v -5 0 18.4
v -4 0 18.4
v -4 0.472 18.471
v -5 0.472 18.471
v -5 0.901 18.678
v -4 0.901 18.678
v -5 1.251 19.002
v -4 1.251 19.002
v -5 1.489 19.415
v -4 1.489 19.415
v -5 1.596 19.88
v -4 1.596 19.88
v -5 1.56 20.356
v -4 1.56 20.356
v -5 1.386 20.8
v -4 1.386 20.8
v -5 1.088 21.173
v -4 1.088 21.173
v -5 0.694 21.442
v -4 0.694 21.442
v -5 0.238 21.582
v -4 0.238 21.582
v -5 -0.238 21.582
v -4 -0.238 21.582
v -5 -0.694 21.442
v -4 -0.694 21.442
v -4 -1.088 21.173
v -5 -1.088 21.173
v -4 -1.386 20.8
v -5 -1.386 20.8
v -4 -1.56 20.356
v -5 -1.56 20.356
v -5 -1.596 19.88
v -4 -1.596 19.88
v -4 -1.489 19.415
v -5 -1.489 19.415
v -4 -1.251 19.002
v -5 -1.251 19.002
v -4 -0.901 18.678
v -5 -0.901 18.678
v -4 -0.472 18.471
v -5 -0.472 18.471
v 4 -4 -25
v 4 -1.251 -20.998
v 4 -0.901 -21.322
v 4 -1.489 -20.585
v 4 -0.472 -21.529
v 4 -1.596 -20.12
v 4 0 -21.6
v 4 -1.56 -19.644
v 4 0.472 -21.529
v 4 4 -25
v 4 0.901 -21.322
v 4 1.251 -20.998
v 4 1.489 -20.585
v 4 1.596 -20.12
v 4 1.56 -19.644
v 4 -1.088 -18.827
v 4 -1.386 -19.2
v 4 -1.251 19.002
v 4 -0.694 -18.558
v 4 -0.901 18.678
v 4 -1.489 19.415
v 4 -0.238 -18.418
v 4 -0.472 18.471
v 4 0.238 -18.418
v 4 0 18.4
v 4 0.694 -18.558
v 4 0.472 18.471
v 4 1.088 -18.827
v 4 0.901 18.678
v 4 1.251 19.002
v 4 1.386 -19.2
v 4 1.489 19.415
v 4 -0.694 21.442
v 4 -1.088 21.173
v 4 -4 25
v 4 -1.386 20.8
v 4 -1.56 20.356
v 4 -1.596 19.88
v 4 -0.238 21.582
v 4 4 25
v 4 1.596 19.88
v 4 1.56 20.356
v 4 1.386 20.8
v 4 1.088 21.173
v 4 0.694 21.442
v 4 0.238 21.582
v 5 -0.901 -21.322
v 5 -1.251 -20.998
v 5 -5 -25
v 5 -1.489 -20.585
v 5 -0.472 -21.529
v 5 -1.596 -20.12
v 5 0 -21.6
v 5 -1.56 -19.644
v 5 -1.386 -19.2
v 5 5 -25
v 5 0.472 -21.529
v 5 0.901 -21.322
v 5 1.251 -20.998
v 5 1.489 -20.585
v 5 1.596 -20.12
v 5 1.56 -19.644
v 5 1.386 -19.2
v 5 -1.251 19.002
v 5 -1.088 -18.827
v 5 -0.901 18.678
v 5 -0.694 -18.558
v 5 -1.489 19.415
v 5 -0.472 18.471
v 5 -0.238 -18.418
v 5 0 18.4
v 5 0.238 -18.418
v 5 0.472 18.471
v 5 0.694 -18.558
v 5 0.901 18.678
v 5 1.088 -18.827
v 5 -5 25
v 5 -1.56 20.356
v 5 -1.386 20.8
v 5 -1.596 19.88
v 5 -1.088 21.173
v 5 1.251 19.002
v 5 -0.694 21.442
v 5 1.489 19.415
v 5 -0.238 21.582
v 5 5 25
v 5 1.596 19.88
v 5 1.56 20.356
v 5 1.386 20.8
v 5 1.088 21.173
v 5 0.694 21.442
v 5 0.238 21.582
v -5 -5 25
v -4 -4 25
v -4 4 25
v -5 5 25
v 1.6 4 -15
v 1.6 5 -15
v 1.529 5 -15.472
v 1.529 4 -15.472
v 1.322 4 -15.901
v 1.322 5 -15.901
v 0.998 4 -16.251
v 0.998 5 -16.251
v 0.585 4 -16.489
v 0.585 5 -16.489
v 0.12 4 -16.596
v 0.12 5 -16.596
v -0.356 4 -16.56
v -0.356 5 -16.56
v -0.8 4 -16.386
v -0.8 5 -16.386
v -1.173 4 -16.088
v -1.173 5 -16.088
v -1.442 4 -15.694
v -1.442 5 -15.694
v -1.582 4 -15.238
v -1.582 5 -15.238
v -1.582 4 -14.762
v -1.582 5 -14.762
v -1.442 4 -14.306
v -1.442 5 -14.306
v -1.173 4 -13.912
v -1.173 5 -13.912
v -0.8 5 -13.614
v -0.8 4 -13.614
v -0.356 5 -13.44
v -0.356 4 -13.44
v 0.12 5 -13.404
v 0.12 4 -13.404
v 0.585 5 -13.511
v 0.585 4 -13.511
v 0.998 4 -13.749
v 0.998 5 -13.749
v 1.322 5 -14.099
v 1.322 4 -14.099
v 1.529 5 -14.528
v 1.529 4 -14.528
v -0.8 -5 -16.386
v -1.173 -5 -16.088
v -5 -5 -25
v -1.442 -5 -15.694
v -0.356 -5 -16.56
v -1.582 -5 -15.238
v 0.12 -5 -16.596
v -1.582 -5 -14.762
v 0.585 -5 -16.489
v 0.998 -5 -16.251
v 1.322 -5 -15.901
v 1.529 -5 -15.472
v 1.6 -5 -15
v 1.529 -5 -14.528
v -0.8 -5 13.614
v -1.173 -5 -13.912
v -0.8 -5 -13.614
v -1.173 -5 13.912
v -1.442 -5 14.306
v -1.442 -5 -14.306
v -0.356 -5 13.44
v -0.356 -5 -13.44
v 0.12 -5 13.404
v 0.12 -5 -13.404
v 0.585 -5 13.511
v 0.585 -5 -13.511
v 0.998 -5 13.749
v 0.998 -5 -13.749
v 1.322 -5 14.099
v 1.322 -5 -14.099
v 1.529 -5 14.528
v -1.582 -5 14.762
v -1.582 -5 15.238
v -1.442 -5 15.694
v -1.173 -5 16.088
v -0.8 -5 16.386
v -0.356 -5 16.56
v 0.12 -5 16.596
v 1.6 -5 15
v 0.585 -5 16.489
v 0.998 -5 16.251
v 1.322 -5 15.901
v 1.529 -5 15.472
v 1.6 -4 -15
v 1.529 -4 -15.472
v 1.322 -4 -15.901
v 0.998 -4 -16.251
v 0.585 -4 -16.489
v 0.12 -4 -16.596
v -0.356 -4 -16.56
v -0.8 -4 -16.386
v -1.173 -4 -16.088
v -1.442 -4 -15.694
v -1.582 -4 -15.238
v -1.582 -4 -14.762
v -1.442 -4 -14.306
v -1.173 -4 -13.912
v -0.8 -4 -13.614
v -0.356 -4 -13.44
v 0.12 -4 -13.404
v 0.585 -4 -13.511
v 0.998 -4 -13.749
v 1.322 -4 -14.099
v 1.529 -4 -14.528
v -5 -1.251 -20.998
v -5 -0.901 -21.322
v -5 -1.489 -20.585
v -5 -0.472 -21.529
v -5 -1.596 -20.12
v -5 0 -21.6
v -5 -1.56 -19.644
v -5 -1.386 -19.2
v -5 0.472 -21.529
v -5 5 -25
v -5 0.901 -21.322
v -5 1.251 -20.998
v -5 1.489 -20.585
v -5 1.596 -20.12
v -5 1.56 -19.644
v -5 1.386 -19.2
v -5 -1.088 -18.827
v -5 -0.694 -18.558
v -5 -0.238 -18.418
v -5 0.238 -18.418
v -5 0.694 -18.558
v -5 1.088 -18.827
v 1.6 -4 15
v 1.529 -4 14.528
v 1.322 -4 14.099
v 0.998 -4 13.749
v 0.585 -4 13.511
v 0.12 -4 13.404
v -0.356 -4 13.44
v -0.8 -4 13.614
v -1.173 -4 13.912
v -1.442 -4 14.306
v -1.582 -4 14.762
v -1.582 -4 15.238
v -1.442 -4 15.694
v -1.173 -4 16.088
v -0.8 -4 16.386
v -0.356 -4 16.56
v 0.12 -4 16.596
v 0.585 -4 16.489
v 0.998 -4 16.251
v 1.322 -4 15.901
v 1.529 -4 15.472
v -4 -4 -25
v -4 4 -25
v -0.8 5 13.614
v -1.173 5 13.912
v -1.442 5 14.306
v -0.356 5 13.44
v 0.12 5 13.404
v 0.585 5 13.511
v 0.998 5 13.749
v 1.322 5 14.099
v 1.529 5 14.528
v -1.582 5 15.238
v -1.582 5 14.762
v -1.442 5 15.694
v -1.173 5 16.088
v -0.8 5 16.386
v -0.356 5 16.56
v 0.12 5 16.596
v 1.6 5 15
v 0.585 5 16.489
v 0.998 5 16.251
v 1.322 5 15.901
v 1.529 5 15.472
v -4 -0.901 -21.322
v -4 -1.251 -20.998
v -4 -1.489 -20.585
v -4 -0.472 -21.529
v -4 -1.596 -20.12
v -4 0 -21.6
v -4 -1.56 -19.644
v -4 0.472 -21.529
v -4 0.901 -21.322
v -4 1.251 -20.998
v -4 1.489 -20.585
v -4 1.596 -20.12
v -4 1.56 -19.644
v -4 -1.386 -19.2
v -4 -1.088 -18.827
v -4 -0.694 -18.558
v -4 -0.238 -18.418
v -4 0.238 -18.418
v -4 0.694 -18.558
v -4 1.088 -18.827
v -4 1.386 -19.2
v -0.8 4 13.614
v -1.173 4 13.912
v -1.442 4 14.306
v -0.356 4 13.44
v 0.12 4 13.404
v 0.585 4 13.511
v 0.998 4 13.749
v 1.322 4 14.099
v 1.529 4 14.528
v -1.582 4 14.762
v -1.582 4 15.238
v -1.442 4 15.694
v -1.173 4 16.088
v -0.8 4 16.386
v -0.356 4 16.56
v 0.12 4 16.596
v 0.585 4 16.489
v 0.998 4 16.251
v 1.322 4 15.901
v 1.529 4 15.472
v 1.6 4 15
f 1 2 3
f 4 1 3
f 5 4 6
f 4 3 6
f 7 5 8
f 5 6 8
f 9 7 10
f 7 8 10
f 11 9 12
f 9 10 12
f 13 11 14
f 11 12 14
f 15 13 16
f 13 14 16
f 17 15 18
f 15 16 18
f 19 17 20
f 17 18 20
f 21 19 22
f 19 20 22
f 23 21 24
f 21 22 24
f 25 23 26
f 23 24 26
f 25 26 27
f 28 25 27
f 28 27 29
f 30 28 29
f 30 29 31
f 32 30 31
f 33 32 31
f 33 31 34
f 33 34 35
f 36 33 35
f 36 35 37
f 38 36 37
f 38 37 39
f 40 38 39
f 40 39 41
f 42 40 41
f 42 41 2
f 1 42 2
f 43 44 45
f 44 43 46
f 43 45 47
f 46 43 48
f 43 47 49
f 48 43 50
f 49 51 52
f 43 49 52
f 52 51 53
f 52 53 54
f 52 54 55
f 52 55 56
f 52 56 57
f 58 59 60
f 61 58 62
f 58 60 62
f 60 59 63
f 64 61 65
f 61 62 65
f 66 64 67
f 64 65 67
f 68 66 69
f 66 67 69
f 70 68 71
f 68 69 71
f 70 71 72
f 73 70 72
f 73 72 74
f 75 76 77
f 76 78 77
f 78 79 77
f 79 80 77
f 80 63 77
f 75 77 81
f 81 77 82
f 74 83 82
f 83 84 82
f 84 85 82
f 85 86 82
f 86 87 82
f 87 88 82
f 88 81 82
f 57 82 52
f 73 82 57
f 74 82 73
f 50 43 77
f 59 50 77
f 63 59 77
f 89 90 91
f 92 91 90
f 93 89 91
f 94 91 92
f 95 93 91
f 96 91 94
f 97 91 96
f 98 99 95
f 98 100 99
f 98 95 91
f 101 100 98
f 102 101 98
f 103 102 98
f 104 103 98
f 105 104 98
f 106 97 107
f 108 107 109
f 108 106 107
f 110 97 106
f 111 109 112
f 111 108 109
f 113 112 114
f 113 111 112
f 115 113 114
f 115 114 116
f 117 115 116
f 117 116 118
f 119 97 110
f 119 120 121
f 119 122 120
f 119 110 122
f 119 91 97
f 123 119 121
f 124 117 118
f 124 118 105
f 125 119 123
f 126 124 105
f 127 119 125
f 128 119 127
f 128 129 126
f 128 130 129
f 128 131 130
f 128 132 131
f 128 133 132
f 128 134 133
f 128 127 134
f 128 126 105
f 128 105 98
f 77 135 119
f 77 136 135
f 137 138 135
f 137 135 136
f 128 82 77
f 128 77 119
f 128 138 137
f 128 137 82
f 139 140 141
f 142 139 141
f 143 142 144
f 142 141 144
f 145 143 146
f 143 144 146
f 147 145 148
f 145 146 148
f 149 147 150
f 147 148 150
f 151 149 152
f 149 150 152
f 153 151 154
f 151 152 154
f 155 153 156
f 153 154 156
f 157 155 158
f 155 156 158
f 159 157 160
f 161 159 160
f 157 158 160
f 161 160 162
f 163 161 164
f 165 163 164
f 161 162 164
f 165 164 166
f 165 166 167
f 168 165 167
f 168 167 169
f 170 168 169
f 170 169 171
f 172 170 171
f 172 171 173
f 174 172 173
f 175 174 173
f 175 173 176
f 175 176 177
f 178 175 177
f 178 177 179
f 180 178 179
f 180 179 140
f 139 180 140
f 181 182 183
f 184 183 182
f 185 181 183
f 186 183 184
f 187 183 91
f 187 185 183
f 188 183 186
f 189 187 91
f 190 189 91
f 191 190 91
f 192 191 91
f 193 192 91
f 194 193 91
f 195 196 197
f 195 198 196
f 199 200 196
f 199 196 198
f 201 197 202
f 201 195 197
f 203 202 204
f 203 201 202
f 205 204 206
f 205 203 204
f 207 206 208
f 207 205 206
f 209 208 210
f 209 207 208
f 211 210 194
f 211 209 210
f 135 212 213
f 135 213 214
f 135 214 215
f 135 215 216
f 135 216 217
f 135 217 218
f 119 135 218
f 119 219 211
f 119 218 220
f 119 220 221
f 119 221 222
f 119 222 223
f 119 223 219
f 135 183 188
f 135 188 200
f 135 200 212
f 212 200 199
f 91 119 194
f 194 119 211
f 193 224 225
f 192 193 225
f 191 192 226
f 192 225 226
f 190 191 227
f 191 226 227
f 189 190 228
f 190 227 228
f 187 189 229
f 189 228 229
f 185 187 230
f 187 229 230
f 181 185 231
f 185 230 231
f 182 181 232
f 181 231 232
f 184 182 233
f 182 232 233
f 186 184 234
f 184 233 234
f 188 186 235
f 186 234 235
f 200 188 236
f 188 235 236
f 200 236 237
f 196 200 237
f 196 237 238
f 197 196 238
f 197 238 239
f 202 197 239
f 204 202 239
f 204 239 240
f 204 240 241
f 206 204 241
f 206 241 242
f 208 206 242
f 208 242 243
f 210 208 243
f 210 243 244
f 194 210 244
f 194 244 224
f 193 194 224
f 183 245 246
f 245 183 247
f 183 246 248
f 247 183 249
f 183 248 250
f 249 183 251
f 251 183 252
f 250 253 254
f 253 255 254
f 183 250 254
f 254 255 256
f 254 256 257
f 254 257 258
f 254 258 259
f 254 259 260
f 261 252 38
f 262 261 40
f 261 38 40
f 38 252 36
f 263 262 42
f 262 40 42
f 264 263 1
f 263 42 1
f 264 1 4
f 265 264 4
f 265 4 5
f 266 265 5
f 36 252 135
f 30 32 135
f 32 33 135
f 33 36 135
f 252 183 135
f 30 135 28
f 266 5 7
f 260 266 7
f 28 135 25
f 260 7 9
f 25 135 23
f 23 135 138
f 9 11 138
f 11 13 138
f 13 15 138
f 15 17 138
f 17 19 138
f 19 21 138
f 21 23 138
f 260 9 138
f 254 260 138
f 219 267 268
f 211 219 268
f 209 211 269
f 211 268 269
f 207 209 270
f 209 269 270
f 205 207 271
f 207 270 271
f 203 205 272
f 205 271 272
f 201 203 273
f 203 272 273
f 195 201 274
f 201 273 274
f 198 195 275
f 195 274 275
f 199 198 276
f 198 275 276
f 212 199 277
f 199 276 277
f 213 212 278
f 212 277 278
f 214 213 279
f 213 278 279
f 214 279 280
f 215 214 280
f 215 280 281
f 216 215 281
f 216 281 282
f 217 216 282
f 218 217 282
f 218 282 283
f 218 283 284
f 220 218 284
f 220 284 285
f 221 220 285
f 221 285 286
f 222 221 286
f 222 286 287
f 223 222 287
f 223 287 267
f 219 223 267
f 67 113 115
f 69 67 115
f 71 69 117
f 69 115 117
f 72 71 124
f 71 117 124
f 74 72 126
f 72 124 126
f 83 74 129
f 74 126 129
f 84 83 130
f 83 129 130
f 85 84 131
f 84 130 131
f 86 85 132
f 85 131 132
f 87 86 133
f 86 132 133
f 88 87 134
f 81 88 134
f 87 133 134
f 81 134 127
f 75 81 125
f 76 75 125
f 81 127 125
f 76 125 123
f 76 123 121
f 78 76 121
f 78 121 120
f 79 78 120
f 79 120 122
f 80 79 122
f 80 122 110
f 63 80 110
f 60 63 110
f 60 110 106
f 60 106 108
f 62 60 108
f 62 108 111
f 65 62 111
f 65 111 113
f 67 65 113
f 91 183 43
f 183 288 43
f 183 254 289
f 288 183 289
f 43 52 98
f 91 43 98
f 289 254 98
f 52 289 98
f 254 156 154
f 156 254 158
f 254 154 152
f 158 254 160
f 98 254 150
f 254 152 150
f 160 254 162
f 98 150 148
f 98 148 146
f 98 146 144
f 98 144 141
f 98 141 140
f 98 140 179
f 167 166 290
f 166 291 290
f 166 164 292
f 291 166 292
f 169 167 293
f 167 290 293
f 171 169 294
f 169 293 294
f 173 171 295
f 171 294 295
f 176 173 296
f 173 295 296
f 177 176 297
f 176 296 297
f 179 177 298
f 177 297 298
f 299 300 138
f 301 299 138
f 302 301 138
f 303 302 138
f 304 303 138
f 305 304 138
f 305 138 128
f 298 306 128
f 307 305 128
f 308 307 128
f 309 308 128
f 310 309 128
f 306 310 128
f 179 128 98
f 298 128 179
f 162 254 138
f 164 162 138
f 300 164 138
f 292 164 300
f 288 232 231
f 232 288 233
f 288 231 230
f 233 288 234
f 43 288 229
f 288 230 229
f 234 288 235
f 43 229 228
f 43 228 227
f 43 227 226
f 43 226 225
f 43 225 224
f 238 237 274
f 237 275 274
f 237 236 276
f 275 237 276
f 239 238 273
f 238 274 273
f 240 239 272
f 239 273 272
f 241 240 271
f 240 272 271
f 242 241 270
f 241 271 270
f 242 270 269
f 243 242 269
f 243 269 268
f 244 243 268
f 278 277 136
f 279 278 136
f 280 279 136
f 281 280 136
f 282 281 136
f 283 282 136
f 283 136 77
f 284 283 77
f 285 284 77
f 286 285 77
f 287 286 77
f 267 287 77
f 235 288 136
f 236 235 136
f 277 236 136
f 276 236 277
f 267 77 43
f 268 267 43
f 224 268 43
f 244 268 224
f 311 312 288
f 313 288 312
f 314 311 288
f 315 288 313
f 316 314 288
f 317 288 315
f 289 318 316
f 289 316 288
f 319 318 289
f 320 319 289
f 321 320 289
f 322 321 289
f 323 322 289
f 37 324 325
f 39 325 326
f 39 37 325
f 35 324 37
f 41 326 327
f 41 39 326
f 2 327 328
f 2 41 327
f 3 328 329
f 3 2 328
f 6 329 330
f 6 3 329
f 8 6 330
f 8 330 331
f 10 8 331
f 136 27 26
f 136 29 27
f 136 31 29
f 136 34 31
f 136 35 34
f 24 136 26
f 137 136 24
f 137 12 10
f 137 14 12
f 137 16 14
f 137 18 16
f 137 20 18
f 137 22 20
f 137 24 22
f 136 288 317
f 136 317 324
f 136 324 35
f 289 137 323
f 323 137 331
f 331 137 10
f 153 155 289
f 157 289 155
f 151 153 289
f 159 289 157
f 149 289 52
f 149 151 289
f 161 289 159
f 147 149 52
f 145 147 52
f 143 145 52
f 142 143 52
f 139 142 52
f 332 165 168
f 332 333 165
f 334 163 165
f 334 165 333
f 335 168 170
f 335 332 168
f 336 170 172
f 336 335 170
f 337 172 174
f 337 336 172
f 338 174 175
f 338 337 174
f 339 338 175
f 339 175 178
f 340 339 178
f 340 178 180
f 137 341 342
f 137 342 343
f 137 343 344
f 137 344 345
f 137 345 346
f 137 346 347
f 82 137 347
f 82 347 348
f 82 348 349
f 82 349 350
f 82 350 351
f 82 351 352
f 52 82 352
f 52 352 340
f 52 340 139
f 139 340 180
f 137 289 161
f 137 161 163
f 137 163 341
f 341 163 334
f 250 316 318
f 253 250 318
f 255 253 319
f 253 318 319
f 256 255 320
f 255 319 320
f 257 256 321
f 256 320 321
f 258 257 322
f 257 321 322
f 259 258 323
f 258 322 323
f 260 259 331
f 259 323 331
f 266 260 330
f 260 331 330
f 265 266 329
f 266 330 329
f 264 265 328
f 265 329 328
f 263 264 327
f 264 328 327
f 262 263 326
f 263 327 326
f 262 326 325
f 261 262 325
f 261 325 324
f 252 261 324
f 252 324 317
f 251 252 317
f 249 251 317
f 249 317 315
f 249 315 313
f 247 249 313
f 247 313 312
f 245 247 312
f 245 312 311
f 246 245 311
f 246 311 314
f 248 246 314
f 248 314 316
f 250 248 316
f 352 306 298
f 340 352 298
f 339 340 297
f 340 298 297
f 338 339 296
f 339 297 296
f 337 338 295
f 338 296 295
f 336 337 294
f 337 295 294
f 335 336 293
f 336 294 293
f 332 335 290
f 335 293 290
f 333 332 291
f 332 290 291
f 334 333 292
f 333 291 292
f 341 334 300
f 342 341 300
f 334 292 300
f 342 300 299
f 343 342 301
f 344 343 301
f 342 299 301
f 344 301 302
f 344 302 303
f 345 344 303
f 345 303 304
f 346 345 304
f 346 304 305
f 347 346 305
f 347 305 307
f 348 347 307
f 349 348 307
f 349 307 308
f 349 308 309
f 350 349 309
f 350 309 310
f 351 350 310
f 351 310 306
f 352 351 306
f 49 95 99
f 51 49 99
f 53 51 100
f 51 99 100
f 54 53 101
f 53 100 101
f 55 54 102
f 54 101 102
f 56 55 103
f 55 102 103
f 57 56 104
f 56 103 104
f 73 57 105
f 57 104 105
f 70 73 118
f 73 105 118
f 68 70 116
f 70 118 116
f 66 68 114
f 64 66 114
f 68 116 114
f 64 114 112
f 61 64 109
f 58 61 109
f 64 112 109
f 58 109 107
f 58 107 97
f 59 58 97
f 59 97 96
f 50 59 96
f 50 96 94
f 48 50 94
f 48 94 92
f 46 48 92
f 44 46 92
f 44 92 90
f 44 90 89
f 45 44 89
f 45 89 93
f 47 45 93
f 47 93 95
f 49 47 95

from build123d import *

# Parameters (mm, degrees)
SKETCH_1_W          = 10
SKETCH_1_H          = 10
SKETCH_1_W_2        = 8
SKETCH_1_H_2        = 8
EXTRUDE_1_DEPTH     = 25
SKETCH_3_R          = 1.6
CUT_EXTRUDE_1_DEPTH = 11
SKETCH_4_R          = 1.6
CUT_EXTRUDE_2_DEPTH = 11


with BuildPart() as part:
    # ｽｹｯﾁ1 → ﾎﾞｽ - 押し出し1 (new body, symmetric)
    with BuildSketch(Plane.XY):
        Rectangle(SKETCH_1_W, SKETCH_1_H)
        Rectangle(SKETCH_1_W_2, SKETCH_1_H_2, mode=Mode.SUBTRACT)
    extrude(amount=EXTRUDE_1_DEPTH, both=True)

    # ｽｹｯﾁ3 → ｶｯﾄ - 押し出し1 (cut, through all)
    with BuildSketch(Plane(origin=(5, 0, 0), x_dir=(0, 0, -1), z_dir=(1, 0, 0))):
        with Locations((-20, 0)):
            Circle(SKETCH_3_R)
        with Locations((20, 0)):
            Circle(SKETCH_3_R)
    extrude(amount=-CUT_EXTRUDE_1_DEPTH, mode=Mode.SUBTRACT)

    # ｽｹｯﾁ4 → ｶｯﾄ - 押し出し2 (cut, through all)
    with BuildSketch(Plane(origin=(0, 5, 0), x_dir=(1, 0, 0), z_dir=(0, 1, 0))):
        with Locations((0, -15)):
            Circle(SKETCH_4_R)
        with Locations((0, 15)):
            Circle(SKETCH_4_R)
    extrude(amount=-CUT_EXTRUDE_2_DEPTH, mode=Mode.SUBTRACT)


solid = part.part
